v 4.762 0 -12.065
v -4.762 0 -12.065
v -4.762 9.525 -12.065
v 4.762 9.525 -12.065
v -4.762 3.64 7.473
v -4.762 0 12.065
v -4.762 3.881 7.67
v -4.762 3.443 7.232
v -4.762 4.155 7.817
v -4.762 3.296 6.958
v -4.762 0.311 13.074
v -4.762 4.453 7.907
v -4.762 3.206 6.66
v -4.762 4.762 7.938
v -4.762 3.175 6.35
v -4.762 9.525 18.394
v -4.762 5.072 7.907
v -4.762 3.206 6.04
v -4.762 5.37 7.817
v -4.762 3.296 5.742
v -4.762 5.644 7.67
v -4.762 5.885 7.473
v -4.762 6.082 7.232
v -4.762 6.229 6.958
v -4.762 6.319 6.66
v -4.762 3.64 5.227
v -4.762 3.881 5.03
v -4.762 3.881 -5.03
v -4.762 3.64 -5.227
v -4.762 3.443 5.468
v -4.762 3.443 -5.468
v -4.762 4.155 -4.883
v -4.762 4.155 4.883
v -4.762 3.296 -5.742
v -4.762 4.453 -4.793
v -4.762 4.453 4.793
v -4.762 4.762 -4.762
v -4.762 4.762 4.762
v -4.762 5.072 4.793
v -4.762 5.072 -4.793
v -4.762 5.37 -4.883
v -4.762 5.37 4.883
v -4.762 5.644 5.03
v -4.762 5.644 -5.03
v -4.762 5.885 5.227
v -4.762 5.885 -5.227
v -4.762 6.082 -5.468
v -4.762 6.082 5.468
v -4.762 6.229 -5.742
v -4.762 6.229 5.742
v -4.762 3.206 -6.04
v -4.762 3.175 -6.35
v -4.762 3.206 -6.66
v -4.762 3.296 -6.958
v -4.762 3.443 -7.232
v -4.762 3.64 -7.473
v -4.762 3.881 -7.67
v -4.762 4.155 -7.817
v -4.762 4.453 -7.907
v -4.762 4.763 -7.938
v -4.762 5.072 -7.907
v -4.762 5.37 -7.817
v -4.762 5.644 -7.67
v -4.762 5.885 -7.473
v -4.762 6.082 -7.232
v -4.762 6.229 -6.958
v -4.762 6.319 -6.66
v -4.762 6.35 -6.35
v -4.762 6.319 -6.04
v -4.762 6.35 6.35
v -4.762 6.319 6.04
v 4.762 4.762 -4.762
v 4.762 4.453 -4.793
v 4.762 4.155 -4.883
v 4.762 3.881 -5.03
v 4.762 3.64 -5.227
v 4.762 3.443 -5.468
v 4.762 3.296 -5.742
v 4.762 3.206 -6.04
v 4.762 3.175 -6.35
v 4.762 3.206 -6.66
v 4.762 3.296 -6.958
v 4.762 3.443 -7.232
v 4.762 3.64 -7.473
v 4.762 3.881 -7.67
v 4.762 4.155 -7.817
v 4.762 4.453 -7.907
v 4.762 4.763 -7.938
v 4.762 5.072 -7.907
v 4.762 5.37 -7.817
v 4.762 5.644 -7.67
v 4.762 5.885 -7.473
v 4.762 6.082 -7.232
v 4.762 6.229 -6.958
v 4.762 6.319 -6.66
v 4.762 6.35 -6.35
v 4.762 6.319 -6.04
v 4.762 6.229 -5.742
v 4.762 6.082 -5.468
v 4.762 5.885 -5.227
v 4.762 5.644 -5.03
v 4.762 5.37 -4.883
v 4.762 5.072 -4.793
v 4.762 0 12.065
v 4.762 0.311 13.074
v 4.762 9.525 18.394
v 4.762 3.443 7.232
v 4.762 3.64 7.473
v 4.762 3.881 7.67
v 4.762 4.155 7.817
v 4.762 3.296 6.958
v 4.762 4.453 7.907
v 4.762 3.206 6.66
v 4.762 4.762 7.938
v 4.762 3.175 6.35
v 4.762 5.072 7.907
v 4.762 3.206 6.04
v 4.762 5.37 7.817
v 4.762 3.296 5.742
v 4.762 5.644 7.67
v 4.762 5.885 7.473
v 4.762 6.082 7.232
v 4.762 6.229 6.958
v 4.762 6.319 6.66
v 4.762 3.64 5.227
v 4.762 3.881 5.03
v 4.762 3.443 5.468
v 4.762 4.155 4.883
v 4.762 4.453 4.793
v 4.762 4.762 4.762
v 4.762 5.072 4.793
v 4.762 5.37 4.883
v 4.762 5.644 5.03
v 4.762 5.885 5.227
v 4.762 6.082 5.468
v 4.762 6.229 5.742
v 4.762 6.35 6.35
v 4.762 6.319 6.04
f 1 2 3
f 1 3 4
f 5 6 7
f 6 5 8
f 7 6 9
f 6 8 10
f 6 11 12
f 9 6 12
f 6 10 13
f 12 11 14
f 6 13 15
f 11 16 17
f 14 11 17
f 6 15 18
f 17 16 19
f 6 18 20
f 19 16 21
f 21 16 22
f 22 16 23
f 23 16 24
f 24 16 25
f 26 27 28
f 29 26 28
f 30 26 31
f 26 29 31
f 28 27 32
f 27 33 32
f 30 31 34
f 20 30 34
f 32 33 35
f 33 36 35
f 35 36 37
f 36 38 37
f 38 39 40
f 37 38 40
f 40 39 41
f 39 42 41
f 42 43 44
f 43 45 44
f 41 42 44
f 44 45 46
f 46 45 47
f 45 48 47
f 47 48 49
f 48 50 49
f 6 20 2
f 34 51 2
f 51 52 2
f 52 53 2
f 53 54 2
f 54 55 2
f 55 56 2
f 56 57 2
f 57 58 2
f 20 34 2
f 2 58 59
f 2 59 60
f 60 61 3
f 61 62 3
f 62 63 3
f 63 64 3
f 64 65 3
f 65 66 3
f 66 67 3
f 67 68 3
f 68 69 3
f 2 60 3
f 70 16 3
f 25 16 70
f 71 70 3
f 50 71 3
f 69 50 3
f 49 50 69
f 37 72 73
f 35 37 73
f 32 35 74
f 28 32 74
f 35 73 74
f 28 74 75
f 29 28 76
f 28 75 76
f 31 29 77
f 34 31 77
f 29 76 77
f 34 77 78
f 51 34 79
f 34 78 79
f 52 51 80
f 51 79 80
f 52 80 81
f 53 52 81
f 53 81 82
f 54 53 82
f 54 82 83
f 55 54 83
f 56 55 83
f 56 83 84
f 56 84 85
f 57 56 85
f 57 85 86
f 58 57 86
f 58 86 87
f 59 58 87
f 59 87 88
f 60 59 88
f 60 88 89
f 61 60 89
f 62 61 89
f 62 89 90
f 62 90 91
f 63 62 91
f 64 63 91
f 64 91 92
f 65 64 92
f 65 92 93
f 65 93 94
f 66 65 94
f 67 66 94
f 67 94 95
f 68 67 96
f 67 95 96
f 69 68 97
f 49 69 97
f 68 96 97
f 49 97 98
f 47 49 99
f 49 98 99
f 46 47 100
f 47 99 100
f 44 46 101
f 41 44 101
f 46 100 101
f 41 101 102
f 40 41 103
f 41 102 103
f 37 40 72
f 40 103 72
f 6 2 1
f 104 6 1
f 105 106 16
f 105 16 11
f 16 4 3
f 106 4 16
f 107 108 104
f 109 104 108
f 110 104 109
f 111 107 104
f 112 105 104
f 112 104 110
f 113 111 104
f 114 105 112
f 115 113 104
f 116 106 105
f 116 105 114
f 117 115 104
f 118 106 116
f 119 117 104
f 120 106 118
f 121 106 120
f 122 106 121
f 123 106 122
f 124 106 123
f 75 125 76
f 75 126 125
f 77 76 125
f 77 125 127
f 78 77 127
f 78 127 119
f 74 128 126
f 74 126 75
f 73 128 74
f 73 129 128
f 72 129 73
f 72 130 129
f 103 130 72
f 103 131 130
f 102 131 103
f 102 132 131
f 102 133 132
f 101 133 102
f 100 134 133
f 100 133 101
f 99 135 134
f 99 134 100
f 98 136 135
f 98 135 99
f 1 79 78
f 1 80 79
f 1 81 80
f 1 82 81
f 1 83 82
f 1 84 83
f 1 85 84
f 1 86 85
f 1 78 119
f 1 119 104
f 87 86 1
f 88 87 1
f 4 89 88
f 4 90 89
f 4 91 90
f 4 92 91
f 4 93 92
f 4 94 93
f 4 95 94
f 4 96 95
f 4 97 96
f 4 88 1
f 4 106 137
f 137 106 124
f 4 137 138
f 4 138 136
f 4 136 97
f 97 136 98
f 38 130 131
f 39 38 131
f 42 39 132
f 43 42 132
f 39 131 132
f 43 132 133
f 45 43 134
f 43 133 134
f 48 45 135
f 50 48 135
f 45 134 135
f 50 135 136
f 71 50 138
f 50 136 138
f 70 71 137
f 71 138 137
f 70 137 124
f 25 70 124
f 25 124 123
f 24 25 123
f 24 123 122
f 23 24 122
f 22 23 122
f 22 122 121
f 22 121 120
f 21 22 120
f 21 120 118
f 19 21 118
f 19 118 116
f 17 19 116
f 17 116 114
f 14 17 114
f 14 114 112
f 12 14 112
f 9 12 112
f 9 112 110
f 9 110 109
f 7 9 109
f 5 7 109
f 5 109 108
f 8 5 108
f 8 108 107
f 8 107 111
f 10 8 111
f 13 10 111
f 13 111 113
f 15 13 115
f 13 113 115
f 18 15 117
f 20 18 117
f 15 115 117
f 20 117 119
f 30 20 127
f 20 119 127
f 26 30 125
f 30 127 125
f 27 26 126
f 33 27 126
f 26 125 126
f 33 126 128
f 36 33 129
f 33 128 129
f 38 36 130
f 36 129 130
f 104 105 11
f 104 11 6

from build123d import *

# Parameters (mm, degrees)
SKETCH1_W      = 9.525
SKETCH1_H      = 24.13
EXTRUDE1_DEPTH = 9.525
SKETCH2_R      = 1.5875
EXTRUDE2_DEPTH = 10.525
EXTRUDE3_DEPTH = 9.525


with BuildPart() as part:
    # Sketch1 → Extrude1 (new body)
    with BuildSketch(Plane(origin=(0, 0, 0), x_dir=(1, 0, 0), z_dir=(0, 1, 0))):
        Rectangle(SKETCH1_W, SKETCH1_H)
    extrude(amount=EXTRUDE1_DEPTH)

    # Sketch2 → Extrude2 (cut, through all)
    with BuildSketch(Plane(origin=(4.7625, 0, 0), x_dir=(0, 0, -1), z_dir=(1, 0, 0))):
        with Locations((-6.35, 4.7625)):
            Circle(SKETCH2_R)
        with Locations(Location((6.35, 4.7625, 0), (0, 0, 180))):  # turned: the seam where the file's is
            Circle(SKETCH2_R)
    extrude(amount=-EXTRUDE2_DEPTH, mode=Mode.SUBTRACT)

    # Sketch3 → Extrude3 (add, through all)
    with BuildSketch(Plane(origin=(4.7625, 0, 0), x_dir=(0, 0, -1), z_dir=(1, 0, 0))):
        Polygon((-12.065, 9.525), (-18.394320409, 9.525), (-13.074387176, 0.310605347), (-12.065, 0), align=None)
    extrude(amount=-EXTRUDE3_DEPTH)


solid = part.part
